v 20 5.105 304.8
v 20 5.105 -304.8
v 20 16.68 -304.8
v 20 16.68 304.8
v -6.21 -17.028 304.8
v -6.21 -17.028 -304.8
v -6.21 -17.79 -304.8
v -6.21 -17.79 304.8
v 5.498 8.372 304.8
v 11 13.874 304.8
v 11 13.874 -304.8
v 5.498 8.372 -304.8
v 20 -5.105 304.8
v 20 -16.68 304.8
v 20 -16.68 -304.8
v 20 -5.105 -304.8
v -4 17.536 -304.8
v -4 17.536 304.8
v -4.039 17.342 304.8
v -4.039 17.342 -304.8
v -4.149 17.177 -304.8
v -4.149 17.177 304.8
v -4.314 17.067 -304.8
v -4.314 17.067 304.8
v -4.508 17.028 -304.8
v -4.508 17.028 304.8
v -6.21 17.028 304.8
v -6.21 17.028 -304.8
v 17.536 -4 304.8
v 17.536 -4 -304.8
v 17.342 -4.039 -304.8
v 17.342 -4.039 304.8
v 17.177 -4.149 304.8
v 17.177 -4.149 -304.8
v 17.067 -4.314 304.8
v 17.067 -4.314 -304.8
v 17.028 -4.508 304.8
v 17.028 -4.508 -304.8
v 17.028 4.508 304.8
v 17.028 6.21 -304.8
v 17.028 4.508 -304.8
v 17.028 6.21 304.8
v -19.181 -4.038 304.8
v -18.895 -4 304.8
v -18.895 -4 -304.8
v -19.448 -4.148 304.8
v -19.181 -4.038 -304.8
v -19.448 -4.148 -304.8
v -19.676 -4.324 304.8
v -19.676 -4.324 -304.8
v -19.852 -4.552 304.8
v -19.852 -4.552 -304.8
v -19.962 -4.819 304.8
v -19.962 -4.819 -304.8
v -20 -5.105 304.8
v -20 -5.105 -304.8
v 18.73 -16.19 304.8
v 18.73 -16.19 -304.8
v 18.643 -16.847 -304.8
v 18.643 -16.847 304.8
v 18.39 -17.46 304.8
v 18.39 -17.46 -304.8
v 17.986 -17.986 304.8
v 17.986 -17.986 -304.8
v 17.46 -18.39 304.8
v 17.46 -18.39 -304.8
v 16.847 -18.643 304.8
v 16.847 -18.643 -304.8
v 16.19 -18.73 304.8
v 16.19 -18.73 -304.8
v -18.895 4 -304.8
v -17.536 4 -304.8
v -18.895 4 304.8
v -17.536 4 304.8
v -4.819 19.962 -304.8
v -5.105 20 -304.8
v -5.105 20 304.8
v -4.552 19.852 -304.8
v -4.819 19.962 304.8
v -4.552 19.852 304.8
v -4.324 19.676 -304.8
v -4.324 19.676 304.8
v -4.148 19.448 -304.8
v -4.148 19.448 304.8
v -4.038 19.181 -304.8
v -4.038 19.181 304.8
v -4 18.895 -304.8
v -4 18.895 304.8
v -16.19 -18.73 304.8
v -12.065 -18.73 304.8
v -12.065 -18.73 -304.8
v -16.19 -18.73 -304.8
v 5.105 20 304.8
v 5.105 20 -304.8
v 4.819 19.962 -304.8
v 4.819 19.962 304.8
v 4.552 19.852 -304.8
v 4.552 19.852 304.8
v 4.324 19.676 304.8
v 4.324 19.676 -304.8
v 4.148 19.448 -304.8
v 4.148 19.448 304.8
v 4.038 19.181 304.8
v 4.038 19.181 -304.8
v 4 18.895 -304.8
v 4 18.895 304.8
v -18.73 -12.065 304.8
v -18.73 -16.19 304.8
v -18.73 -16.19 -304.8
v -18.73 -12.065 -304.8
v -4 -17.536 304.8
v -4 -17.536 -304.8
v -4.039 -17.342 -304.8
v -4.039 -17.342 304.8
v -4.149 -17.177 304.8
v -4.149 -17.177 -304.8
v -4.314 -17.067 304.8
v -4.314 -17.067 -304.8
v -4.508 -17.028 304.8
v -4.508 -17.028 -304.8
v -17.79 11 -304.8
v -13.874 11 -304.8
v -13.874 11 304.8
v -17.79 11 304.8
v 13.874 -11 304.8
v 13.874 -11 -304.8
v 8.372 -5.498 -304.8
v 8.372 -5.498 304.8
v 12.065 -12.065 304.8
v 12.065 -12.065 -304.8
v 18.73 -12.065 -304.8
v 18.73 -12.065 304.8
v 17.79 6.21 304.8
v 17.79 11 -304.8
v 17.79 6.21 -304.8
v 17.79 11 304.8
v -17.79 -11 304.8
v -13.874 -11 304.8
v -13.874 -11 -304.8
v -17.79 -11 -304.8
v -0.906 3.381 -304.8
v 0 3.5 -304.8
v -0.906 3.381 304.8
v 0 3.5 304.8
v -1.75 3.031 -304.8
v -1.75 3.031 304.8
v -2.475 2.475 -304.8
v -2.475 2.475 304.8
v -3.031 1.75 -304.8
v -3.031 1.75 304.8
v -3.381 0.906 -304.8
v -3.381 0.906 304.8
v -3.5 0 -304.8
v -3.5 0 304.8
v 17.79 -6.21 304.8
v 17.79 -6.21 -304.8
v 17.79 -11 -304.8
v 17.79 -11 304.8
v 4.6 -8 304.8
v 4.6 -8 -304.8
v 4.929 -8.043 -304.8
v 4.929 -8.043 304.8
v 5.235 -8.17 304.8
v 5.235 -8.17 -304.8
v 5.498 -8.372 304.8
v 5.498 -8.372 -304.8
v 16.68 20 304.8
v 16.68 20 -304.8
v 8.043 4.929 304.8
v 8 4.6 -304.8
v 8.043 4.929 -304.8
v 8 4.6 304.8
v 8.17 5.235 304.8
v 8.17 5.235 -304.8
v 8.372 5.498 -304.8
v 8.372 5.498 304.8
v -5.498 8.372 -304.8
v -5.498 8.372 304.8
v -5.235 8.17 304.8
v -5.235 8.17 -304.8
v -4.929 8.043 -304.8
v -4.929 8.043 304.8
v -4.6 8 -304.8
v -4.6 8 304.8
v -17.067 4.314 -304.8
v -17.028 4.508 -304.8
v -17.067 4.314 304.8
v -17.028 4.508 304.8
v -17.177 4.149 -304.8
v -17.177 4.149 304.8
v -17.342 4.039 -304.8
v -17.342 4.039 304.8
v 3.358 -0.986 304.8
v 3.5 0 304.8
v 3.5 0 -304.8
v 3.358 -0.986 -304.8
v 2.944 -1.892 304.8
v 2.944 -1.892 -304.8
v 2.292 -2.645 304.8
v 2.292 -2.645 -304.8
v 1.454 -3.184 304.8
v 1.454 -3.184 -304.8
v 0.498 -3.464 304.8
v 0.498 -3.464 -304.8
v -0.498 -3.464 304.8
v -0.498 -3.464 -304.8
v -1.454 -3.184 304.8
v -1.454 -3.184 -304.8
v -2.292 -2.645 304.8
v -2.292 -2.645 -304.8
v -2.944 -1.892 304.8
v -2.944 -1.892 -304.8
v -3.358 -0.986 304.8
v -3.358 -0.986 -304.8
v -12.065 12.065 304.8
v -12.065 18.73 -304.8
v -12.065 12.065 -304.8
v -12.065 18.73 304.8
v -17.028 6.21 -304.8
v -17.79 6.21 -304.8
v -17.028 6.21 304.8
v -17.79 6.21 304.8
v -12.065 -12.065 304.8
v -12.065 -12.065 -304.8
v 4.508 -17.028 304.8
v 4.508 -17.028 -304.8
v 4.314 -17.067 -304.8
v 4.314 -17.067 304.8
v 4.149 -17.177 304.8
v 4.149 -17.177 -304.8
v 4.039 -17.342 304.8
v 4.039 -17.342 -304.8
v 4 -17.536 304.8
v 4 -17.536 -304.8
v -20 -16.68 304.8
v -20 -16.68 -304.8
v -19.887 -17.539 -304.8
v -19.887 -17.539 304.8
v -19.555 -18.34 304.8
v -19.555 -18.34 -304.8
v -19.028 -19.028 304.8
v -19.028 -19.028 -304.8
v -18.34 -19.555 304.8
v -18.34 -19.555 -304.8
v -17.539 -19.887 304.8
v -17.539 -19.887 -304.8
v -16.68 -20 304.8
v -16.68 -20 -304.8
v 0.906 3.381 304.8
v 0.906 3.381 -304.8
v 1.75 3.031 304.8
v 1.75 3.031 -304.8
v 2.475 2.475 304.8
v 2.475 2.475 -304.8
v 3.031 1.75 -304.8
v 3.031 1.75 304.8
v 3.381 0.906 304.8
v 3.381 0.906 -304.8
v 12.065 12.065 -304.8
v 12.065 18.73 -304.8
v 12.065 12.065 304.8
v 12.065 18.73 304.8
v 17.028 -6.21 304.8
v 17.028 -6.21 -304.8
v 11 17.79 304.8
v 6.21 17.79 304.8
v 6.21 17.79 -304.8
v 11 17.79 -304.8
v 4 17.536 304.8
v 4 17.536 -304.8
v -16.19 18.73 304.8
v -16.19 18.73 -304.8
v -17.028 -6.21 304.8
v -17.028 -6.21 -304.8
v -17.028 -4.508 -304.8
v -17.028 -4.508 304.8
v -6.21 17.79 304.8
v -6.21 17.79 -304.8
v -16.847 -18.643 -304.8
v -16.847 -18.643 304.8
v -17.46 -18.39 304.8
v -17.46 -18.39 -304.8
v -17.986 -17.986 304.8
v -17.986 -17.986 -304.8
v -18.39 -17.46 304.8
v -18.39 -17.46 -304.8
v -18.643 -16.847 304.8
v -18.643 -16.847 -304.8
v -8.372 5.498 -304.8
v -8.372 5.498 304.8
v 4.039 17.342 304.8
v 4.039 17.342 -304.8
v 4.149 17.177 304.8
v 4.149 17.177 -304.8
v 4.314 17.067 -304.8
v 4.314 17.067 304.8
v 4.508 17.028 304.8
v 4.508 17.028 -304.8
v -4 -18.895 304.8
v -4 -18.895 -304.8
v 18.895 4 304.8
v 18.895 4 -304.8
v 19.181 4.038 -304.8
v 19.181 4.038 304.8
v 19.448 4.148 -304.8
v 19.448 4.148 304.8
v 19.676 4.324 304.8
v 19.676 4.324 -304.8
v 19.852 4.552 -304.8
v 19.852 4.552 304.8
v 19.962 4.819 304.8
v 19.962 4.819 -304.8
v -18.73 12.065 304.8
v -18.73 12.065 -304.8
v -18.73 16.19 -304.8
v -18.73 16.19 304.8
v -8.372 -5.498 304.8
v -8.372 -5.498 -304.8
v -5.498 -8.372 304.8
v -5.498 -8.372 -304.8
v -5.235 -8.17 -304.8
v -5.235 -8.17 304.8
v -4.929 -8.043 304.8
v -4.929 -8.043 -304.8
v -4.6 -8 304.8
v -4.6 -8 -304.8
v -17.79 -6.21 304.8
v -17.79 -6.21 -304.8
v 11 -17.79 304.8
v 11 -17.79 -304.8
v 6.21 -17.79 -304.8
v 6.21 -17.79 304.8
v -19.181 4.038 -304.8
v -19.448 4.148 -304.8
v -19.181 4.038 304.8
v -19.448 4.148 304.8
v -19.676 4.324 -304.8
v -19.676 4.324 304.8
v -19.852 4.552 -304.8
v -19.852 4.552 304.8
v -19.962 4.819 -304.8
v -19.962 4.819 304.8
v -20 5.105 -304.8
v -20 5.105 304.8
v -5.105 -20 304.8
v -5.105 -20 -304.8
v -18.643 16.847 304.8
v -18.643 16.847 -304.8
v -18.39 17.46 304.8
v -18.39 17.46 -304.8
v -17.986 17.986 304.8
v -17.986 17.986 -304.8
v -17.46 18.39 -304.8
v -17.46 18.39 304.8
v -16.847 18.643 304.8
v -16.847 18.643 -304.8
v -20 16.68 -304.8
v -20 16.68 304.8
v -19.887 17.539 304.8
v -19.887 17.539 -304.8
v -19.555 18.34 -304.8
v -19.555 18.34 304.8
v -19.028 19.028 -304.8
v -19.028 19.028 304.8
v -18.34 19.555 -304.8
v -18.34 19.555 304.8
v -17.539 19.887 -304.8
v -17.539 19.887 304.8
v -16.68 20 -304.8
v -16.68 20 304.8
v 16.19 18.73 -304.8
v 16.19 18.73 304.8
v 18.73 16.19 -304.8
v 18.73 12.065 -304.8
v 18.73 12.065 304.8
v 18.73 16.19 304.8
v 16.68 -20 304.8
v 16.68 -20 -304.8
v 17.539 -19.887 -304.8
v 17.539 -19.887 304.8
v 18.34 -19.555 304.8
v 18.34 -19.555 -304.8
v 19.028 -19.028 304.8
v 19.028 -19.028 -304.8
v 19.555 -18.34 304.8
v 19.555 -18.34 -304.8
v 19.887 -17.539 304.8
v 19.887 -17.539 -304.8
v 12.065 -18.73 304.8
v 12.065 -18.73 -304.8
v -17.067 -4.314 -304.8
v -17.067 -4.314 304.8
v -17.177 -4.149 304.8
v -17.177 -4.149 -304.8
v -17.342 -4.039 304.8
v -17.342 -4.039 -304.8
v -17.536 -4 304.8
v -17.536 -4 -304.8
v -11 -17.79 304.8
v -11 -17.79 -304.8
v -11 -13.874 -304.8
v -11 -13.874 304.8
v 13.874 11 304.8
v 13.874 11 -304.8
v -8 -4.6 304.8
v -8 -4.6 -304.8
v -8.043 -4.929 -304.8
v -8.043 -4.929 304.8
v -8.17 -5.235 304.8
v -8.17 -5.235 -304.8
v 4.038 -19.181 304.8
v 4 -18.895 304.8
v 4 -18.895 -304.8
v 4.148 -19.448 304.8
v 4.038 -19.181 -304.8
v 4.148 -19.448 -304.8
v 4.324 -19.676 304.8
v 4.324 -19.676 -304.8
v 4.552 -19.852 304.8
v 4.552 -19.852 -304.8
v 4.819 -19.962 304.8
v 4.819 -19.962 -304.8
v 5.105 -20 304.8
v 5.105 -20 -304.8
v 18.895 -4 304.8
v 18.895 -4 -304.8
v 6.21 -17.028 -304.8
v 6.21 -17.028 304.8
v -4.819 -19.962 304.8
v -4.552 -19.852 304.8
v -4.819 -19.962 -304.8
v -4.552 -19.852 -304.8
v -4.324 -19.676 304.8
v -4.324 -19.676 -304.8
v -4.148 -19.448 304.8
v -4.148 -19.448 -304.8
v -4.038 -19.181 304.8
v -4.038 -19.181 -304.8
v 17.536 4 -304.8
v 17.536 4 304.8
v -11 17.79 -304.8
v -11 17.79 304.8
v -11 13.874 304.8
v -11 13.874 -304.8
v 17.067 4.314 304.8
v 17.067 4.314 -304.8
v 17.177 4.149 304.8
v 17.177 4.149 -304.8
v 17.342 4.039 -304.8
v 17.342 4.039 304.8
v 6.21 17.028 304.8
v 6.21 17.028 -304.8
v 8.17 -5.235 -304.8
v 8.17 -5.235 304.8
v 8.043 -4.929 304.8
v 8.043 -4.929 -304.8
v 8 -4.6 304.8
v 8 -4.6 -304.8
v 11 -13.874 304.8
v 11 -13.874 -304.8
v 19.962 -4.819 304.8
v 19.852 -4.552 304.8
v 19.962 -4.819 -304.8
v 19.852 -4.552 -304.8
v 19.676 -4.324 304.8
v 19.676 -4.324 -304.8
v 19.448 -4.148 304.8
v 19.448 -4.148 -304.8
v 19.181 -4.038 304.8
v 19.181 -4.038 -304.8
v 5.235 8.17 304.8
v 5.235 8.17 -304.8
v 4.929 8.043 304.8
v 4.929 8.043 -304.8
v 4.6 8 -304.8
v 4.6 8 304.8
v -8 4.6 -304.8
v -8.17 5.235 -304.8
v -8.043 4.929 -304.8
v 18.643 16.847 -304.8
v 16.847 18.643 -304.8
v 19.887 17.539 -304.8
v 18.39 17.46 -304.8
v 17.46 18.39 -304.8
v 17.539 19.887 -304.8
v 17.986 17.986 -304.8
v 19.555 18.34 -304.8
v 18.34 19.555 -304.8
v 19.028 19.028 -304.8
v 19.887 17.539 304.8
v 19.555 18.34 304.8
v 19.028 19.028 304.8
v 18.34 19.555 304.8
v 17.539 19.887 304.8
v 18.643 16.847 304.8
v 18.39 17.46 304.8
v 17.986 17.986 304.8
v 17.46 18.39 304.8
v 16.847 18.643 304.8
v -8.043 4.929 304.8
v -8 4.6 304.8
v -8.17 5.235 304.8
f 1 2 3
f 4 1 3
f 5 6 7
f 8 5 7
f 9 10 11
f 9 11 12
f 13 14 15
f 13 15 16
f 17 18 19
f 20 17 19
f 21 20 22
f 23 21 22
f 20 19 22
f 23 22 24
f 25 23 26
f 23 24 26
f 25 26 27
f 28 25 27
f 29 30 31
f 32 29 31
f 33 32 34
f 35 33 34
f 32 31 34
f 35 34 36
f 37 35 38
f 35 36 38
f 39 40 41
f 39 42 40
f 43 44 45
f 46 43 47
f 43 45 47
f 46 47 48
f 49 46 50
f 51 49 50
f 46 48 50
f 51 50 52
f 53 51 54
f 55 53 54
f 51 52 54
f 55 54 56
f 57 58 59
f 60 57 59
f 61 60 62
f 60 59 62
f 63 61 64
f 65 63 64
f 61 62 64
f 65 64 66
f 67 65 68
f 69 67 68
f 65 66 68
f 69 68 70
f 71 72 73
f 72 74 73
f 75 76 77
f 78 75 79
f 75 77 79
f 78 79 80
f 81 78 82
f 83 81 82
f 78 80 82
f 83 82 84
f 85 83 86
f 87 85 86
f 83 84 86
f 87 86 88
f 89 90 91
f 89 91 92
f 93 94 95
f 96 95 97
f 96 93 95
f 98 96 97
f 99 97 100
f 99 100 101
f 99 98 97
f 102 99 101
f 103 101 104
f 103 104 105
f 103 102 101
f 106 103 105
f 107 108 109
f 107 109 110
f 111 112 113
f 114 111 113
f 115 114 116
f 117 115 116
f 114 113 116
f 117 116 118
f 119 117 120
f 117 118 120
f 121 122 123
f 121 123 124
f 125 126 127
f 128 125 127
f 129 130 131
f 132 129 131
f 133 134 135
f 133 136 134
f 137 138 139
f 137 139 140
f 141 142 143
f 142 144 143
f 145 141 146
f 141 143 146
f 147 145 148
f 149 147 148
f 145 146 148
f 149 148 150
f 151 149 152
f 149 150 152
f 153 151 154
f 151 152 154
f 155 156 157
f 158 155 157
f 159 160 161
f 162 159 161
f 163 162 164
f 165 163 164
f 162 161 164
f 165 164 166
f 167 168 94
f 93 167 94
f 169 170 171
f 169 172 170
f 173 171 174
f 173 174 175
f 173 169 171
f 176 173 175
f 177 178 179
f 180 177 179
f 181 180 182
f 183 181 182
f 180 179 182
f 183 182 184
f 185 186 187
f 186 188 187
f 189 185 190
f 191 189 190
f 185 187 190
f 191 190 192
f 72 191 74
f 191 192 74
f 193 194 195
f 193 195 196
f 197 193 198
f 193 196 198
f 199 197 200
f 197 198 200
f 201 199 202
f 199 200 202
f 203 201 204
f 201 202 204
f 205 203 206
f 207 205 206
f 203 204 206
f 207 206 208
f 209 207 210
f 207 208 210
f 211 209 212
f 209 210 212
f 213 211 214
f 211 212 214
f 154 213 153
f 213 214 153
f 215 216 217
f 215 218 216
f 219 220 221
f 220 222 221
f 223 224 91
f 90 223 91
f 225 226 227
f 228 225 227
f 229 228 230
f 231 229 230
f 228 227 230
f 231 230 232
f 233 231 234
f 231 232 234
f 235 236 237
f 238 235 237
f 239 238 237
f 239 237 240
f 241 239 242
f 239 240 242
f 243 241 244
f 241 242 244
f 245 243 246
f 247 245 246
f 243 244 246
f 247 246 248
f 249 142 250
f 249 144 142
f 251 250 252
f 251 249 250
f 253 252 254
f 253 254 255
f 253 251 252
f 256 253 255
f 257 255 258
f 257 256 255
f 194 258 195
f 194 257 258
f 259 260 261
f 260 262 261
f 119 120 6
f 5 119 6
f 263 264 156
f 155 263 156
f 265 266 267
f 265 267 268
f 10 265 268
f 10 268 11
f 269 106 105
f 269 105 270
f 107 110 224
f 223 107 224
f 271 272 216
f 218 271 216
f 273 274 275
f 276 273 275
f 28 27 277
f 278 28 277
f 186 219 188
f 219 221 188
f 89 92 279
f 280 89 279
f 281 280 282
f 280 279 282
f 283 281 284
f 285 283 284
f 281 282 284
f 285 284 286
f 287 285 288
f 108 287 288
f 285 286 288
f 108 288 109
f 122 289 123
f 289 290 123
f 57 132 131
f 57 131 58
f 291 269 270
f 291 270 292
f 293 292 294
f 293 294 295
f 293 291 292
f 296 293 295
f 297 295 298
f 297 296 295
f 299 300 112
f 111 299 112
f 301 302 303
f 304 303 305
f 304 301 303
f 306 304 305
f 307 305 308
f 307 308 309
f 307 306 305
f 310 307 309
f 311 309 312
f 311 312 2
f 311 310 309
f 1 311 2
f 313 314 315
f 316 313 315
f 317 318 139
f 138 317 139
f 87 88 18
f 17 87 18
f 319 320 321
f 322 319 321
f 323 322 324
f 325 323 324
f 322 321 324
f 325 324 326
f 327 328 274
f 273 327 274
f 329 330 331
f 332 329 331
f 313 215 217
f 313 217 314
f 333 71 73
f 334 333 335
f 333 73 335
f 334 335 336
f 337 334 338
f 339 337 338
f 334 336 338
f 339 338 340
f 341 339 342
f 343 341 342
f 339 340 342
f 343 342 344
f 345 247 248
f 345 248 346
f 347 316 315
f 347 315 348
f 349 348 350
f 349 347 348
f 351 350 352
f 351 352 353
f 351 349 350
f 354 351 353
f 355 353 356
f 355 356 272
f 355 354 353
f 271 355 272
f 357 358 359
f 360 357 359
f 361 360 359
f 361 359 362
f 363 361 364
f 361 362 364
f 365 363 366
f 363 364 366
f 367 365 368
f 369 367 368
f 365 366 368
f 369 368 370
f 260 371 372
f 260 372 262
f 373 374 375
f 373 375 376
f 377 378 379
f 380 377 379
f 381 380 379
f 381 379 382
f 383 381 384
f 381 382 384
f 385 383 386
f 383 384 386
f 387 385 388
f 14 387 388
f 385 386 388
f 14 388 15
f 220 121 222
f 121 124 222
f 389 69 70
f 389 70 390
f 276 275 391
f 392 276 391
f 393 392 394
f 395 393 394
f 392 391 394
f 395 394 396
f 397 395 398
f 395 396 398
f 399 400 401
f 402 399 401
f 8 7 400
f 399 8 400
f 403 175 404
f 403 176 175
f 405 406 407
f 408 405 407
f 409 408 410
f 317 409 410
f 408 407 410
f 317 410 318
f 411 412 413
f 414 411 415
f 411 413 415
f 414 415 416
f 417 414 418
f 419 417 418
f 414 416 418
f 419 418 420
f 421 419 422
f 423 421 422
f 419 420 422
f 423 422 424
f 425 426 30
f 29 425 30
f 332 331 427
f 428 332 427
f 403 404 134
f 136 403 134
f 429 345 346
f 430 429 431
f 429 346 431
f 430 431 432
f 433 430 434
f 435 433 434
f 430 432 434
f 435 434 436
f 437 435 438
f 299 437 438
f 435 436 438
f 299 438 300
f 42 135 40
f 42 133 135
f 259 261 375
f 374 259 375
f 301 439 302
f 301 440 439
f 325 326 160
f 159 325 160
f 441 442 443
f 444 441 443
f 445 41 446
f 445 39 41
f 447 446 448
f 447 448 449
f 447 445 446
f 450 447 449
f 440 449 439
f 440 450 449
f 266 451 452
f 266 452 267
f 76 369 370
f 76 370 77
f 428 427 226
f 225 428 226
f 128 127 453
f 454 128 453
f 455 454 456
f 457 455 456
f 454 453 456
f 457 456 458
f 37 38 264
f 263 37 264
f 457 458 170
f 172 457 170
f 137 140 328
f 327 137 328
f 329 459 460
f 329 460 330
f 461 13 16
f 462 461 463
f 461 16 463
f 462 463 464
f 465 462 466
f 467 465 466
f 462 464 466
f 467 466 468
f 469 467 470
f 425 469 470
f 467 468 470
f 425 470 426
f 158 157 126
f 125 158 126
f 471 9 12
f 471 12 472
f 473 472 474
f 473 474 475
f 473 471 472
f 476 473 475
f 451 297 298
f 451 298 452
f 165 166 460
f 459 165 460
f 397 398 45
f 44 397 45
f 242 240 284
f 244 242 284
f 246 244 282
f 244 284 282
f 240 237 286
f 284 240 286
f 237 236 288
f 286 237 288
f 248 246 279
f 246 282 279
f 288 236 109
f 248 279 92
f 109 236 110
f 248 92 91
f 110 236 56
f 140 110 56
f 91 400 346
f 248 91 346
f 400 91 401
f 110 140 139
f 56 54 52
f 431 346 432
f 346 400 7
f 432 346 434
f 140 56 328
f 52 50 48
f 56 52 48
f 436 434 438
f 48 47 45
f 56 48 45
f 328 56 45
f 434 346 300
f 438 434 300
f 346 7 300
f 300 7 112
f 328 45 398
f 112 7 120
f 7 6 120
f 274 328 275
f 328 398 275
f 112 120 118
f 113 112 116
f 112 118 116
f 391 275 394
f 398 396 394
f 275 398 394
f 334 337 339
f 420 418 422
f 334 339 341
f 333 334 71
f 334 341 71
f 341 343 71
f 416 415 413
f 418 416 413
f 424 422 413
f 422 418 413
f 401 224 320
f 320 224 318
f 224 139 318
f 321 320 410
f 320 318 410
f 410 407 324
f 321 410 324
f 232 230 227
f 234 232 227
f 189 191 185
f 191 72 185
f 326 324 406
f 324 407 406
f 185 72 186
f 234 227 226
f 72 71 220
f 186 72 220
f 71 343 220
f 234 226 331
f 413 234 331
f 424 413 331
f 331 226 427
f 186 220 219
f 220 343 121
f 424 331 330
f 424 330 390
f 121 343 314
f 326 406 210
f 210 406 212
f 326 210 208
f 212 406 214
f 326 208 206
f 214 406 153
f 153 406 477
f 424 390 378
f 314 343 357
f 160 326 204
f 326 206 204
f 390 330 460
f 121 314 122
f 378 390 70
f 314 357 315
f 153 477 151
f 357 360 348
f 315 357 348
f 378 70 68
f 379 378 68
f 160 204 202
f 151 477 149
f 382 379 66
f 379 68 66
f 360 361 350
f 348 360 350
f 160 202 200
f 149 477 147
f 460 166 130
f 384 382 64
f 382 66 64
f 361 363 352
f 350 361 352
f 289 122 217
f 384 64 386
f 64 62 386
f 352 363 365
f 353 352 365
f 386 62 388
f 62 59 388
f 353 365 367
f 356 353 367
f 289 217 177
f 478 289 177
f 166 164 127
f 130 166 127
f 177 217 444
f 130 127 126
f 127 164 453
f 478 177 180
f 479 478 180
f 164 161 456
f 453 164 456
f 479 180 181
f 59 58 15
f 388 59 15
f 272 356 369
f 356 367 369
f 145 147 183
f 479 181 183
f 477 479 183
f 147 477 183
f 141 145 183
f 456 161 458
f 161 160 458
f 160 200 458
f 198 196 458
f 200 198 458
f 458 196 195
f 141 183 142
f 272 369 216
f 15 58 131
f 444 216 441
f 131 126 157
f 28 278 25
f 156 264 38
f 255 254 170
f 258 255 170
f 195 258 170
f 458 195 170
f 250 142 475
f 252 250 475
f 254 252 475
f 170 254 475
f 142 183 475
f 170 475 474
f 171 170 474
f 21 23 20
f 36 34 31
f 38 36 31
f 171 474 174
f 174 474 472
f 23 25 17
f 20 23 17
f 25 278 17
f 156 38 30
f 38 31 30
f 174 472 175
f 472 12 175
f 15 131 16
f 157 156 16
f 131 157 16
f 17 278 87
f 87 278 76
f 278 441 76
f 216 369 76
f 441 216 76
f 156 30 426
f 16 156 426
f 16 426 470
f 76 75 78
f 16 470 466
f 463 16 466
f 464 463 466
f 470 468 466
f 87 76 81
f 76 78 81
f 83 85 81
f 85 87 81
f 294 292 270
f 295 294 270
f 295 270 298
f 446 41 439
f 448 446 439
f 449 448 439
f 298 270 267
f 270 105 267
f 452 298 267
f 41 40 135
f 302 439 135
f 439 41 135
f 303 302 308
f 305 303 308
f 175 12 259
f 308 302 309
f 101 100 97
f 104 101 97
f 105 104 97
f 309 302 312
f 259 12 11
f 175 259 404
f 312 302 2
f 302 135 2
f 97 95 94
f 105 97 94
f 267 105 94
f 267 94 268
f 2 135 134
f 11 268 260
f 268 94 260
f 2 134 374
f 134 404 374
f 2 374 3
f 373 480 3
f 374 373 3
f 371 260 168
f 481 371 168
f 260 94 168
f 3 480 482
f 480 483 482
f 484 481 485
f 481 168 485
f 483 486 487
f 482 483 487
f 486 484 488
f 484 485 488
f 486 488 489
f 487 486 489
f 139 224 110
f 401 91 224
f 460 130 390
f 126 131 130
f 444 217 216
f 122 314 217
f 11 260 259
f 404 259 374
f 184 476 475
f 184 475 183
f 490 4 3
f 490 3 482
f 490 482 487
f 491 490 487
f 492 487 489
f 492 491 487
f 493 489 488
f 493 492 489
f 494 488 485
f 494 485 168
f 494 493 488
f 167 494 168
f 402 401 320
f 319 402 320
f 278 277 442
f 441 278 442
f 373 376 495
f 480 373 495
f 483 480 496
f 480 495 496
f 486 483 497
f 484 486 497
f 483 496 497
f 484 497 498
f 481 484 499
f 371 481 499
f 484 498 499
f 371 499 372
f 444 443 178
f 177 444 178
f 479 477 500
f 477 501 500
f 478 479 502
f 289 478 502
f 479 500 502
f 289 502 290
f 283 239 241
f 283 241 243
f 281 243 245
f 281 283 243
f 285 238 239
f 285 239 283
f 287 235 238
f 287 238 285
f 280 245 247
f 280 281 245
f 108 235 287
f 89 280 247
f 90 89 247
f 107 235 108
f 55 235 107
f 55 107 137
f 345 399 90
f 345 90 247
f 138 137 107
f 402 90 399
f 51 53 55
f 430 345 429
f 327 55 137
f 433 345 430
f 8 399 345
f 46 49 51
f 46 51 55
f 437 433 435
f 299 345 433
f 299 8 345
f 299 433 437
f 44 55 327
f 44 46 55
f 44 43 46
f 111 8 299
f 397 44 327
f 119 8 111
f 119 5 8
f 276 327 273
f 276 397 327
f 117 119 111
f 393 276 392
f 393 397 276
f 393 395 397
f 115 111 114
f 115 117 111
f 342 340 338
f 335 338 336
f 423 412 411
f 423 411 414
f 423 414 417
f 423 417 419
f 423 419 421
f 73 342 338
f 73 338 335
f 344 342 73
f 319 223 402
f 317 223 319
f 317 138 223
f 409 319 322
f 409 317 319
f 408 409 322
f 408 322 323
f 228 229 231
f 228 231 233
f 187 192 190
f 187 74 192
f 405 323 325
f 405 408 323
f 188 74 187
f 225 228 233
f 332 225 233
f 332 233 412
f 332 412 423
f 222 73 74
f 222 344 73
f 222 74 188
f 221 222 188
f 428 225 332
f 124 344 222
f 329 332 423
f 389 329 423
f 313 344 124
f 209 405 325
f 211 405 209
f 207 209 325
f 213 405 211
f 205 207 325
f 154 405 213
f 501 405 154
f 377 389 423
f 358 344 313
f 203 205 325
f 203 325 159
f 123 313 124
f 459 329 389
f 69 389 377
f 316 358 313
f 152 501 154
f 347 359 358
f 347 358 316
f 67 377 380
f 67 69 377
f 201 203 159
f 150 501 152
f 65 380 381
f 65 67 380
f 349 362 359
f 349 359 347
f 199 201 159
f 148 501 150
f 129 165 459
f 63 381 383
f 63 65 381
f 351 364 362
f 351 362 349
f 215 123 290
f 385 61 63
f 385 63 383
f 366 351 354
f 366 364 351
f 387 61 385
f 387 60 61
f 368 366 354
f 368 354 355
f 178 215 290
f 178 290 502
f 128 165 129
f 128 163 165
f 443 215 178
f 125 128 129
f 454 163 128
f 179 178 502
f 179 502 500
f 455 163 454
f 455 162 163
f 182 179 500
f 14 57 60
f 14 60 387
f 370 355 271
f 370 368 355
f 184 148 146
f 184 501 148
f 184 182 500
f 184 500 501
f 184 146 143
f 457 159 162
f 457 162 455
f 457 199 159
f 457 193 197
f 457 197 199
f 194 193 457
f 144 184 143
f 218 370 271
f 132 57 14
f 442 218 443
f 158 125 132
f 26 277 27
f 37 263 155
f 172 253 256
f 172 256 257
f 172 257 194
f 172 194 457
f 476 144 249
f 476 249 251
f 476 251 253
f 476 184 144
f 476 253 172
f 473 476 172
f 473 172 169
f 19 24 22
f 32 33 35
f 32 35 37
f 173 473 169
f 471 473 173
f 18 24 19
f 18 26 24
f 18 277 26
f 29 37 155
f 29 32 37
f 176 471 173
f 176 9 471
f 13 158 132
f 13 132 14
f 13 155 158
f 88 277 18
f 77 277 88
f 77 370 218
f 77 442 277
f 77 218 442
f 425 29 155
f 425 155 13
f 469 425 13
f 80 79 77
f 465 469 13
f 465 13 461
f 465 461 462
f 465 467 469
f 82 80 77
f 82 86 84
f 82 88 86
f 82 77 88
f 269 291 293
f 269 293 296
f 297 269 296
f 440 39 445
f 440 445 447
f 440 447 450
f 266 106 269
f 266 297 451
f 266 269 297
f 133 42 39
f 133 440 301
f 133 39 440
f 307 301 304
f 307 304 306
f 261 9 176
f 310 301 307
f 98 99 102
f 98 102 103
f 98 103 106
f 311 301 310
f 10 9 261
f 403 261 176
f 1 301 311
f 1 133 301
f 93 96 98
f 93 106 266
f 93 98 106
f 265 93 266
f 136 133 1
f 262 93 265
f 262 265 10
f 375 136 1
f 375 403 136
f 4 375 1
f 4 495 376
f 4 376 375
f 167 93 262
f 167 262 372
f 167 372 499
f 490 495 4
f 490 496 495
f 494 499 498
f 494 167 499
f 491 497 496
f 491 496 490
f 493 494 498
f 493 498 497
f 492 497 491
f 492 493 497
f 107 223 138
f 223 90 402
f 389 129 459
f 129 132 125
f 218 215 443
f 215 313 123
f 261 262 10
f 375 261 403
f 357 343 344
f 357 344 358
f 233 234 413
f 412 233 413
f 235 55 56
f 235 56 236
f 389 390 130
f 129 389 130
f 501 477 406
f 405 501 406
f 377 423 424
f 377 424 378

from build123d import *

# Parameters (mm, degrees)
BOSS_EXTRUDE1_DEPTH = 304.8
MIRROR3_START       = -304.8
MIRROR3_DEPTH       = 609.6


# Read off the part's stored shape, not the designer's step: Mirror3
with BuildPart() as part:
    # Sketch3 → Boss-Extrude1 (new, symmetric)
    with BuildSketch(Plane.XY):
        with BuildLine():
            Line((0, 8), (0, 3.5))
            ThreePointArc((0, 3.5), (-2.474873734, 2.474873734), (-3.5, 0))
            Line((-3.5, 0), (-8, 0))
            Line((-8, 0), (-8, 4.600266817))
            ThreePointArc((-8, 4.600266817), (-8.096672994, 5.086274776), (-8.371974388, 5.498292429))
            Line((-8.371974388, 5.498292429), (-13.873681959, 11))
            Line((-13.873681959, 11), (-17.7902, 11))
            Line((-17.7902, 11), (-17.7902, 6.2098))
            Line((-17.7902, 6.2098), (-17.0282, 6.2098))
            Line((-17.0282, 6.2098), (-17.0282, 4.508))
            ThreePointArc((-17.0282, 4.508), (-17.176989755, 4.148789755), (-17.5362, 4))
            Line((-17.5362, 4), (-18.8951, 4))
            ThreePointArc((-18.8951, 4), (-19.676382283, 4.323617717), (-20, 5.1049))
            Line((-20, 5.1049), (-20, 16.68))
            ThreePointArc((-20, 16.68), (-19.027594514, 19.027594514), (-16.68, 20))
            Line((-16.68, 20), (-5.1049, 20))
            ThreePointArc((-5.1049, 20), (-4.323617717, 19.676382283), (-4, 18.8951))
            Line((-4, 18.8951), (-4, 17.5362))
            ThreePointArc((-4, 17.5362), (-4.148789755, 17.176989755), (-4.508, 17.0282))
            Line((-4.508, 17.0282), (-6.2098, 17.0282))
            Line((-6.2098, 17.0282), (-6.2098, 17.7902))
            Line((-6.2098, 17.7902), (-11, 17.7902))
            Line((-11, 17.7902), (-11, 13.873681959))
            Line((-11, 13.873681959), (-5.498292429, 8.371974388))
            ThreePointArc((-5.498292429, 8.371974388), (-5.086274776, 8.096672994), (-4.600266817, 8))
            Line((-4.600266817, 8), (0, 8))
        make_face()
        with BuildLine():
            Line((-12.065, 18.73), (-12.065, 12.065))
            Line((-12.065, 12.065), (-18.73, 12.065))
            Line((-18.73, 12.065), (-18.73, 16.19))
            ThreePointArc((-18.73, 16.19), (-17.986051224, 17.986051224), (-16.19, 18.73))
            Line((-16.19, 18.73), (-12.065, 18.73))
        make_face(mode=Mode.SUBTRACT)
    extrude(amount=BOSS_EXTRUDE1_DEPTH, both=True)

    # Mirror1: part across plane


with BuildPart() as part_1:
    add(part.part)
    add(part.part.mirror(Plane(origin=(0, 0, 304.8), x_dir=(0, 0, 1), z_dir=(1, 0, 0))))

    # Mirror3 outline → Mirror3 (add)
    with BuildSketch(Plane.XY.offset(MIRROR3_START)):
        with BuildLine():
            Line((-8, 0), (-8, -4.600266817))
            ThreePointArc((-8, -4.600266817), (-8.096672994, -5.086274776), (-8.371974388, -5.498292429))
            Line((-8.371974388, -5.498292429), (-13.873681959, -11))
            Line((-13.873681959, -11), (-17.7902, -11))
            Line((-17.7902, -11), (-17.7902, -6.2098))
            Line((-17.7902, -6.2098), (-17.0282, -6.2098))
            Line((-17.0282, -6.2098), (-17.0282, -4.508))
            ThreePointArc((-17.0282, -4.508), (-17.176989755, -4.148789755), (-17.5362, -4))
            Line((-17.5362, -4), (-18.8951, -4))
            ThreePointArc((-18.8951, -4), (-19.676382283, -4.323617717), (-20, -5.1049))
            Line((-20, -5.1049), (-20, -16.68))
            ThreePointArc((-20, -16.68), (-19.027594514, -19.027594514), (-16.68, -20))
            Line((-16.68, -20), (-5.1049, -20))
            ThreePointArc((-5.1049, -20), (-4.323617717, -19.676382283), (-4, -18.8951))
            Line((-4, -18.8951), (-4, -17.5362))
            ThreePointArc((-4, -17.5362), (-4.148789755, -17.176989755), (-4.508, -17.0282))
            Line((-4.508, -17.0282), (-6.2098, -17.0282))
            Line((-6.2098, -17.0282), (-6.2098, -17.7902))
            Line((-6.2098, -17.7902), (-11, -17.7902))
            Line((-11, -17.7902), (-11, -13.873681959))
            Line((-11, -13.873681959), (-5.498292429, -8.371974388))
            ThreePointArc((-5.498292429, -8.371974388), (-5.086274776, -8.096672994), (-4.600266817, -8))
            Line((-4.600266817, -8), (4.600266817, -8))
            ThreePointArc((4.600266817, -8), (5.086274776, -8.096672994), (5.498292429, -8.371974388))
            Line((5.498292429, -8.371974388), (11, -13.873681959))
            Line((11, -13.873681959), (11, -17.7902))
            Line((11, -17.7902), (6.2098, -17.7902))
            Line((6.2098, -17.7902), (6.2098, -17.0282))
            Line((6.2098, -17.0282), (4.508, -17.0282))
            ThreePointArc((4.508, -17.0282), (4.148789755, -17.176989755), (4, -17.5362))
            Line((4, -17.5362), (4, -18.8951))
            ThreePointArc((4, -18.8951), (4.323617717, -19.676382283), (5.1049, -20))
            Line((5.1049, -20), (16.68, -20))
            ThreePointArc((16.68, -20), (19.027594514, -19.027594514), (20, -16.68))
            Line((20, -16.68), (20, -5.1049))
            ThreePointArc((20, -5.1049), (19.676382283, -4.323617717), (18.8951, -4))
            Line((18.8951, -4), (17.5362, -4))
            ThreePointArc((17.5362, -4), (17.176989755, -4.148789755), (17.0282, -4.508))
            Line((17.0282, -4.508), (17.0282, -6.2098))
            Line((17.0282, -6.2098), (17.7902, -6.2098))
            Line((17.7902, -6.2098), (17.7902, -11))
            Line((17.7902, -11), (13.873681959, -11))
            Line((13.873681959, -11), (8.371974388, -5.498292429))
            ThreePointArc((8.371974388, -5.498292429), (8.096672994, -5.086274776), (8, -4.600266817))
            Line((8, -4.600266817), (8, 0))
            Line((8, 0), (3.5, 0))
            ThreePointArc((3.5, 0), (0, -3.5), (-3.5, 0))
            Line((-3.5, 0), (-8, 0))
        make_face()
        with BuildLine():
            Line((-12.065, -12.065), (-12.065, -18.73))
            Line((-12.065, -18.73), (-16.19, -18.73))
            ThreePointArc((-16.19, -18.73), (-17.986051224, -17.986051224), (-18.73, -16.19))
            Line((-18.73, -16.19), (-18.73, -12.065))
            Line((-18.73, -12.065), (-12.065, -12.065))
        make_face(mode=Mode.SUBTRACT)
        with BuildLine():
            Line((12.065, -18.73), (12.065, -12.065))
            Line((12.065, -12.065), (18.73, -12.065))
            Line((18.73, -12.065), (18.73, -16.19))
            ThreePointArc((18.73, -16.19), (17.986051224, -17.986051224), (16.19, -18.73))
            Line((16.19, -18.73), (12.065, -18.73))
        make_face(mode=Mode.SUBTRACT)
    extrude(amount=MIRROR3_DEPTH)


solid = part_1.part
